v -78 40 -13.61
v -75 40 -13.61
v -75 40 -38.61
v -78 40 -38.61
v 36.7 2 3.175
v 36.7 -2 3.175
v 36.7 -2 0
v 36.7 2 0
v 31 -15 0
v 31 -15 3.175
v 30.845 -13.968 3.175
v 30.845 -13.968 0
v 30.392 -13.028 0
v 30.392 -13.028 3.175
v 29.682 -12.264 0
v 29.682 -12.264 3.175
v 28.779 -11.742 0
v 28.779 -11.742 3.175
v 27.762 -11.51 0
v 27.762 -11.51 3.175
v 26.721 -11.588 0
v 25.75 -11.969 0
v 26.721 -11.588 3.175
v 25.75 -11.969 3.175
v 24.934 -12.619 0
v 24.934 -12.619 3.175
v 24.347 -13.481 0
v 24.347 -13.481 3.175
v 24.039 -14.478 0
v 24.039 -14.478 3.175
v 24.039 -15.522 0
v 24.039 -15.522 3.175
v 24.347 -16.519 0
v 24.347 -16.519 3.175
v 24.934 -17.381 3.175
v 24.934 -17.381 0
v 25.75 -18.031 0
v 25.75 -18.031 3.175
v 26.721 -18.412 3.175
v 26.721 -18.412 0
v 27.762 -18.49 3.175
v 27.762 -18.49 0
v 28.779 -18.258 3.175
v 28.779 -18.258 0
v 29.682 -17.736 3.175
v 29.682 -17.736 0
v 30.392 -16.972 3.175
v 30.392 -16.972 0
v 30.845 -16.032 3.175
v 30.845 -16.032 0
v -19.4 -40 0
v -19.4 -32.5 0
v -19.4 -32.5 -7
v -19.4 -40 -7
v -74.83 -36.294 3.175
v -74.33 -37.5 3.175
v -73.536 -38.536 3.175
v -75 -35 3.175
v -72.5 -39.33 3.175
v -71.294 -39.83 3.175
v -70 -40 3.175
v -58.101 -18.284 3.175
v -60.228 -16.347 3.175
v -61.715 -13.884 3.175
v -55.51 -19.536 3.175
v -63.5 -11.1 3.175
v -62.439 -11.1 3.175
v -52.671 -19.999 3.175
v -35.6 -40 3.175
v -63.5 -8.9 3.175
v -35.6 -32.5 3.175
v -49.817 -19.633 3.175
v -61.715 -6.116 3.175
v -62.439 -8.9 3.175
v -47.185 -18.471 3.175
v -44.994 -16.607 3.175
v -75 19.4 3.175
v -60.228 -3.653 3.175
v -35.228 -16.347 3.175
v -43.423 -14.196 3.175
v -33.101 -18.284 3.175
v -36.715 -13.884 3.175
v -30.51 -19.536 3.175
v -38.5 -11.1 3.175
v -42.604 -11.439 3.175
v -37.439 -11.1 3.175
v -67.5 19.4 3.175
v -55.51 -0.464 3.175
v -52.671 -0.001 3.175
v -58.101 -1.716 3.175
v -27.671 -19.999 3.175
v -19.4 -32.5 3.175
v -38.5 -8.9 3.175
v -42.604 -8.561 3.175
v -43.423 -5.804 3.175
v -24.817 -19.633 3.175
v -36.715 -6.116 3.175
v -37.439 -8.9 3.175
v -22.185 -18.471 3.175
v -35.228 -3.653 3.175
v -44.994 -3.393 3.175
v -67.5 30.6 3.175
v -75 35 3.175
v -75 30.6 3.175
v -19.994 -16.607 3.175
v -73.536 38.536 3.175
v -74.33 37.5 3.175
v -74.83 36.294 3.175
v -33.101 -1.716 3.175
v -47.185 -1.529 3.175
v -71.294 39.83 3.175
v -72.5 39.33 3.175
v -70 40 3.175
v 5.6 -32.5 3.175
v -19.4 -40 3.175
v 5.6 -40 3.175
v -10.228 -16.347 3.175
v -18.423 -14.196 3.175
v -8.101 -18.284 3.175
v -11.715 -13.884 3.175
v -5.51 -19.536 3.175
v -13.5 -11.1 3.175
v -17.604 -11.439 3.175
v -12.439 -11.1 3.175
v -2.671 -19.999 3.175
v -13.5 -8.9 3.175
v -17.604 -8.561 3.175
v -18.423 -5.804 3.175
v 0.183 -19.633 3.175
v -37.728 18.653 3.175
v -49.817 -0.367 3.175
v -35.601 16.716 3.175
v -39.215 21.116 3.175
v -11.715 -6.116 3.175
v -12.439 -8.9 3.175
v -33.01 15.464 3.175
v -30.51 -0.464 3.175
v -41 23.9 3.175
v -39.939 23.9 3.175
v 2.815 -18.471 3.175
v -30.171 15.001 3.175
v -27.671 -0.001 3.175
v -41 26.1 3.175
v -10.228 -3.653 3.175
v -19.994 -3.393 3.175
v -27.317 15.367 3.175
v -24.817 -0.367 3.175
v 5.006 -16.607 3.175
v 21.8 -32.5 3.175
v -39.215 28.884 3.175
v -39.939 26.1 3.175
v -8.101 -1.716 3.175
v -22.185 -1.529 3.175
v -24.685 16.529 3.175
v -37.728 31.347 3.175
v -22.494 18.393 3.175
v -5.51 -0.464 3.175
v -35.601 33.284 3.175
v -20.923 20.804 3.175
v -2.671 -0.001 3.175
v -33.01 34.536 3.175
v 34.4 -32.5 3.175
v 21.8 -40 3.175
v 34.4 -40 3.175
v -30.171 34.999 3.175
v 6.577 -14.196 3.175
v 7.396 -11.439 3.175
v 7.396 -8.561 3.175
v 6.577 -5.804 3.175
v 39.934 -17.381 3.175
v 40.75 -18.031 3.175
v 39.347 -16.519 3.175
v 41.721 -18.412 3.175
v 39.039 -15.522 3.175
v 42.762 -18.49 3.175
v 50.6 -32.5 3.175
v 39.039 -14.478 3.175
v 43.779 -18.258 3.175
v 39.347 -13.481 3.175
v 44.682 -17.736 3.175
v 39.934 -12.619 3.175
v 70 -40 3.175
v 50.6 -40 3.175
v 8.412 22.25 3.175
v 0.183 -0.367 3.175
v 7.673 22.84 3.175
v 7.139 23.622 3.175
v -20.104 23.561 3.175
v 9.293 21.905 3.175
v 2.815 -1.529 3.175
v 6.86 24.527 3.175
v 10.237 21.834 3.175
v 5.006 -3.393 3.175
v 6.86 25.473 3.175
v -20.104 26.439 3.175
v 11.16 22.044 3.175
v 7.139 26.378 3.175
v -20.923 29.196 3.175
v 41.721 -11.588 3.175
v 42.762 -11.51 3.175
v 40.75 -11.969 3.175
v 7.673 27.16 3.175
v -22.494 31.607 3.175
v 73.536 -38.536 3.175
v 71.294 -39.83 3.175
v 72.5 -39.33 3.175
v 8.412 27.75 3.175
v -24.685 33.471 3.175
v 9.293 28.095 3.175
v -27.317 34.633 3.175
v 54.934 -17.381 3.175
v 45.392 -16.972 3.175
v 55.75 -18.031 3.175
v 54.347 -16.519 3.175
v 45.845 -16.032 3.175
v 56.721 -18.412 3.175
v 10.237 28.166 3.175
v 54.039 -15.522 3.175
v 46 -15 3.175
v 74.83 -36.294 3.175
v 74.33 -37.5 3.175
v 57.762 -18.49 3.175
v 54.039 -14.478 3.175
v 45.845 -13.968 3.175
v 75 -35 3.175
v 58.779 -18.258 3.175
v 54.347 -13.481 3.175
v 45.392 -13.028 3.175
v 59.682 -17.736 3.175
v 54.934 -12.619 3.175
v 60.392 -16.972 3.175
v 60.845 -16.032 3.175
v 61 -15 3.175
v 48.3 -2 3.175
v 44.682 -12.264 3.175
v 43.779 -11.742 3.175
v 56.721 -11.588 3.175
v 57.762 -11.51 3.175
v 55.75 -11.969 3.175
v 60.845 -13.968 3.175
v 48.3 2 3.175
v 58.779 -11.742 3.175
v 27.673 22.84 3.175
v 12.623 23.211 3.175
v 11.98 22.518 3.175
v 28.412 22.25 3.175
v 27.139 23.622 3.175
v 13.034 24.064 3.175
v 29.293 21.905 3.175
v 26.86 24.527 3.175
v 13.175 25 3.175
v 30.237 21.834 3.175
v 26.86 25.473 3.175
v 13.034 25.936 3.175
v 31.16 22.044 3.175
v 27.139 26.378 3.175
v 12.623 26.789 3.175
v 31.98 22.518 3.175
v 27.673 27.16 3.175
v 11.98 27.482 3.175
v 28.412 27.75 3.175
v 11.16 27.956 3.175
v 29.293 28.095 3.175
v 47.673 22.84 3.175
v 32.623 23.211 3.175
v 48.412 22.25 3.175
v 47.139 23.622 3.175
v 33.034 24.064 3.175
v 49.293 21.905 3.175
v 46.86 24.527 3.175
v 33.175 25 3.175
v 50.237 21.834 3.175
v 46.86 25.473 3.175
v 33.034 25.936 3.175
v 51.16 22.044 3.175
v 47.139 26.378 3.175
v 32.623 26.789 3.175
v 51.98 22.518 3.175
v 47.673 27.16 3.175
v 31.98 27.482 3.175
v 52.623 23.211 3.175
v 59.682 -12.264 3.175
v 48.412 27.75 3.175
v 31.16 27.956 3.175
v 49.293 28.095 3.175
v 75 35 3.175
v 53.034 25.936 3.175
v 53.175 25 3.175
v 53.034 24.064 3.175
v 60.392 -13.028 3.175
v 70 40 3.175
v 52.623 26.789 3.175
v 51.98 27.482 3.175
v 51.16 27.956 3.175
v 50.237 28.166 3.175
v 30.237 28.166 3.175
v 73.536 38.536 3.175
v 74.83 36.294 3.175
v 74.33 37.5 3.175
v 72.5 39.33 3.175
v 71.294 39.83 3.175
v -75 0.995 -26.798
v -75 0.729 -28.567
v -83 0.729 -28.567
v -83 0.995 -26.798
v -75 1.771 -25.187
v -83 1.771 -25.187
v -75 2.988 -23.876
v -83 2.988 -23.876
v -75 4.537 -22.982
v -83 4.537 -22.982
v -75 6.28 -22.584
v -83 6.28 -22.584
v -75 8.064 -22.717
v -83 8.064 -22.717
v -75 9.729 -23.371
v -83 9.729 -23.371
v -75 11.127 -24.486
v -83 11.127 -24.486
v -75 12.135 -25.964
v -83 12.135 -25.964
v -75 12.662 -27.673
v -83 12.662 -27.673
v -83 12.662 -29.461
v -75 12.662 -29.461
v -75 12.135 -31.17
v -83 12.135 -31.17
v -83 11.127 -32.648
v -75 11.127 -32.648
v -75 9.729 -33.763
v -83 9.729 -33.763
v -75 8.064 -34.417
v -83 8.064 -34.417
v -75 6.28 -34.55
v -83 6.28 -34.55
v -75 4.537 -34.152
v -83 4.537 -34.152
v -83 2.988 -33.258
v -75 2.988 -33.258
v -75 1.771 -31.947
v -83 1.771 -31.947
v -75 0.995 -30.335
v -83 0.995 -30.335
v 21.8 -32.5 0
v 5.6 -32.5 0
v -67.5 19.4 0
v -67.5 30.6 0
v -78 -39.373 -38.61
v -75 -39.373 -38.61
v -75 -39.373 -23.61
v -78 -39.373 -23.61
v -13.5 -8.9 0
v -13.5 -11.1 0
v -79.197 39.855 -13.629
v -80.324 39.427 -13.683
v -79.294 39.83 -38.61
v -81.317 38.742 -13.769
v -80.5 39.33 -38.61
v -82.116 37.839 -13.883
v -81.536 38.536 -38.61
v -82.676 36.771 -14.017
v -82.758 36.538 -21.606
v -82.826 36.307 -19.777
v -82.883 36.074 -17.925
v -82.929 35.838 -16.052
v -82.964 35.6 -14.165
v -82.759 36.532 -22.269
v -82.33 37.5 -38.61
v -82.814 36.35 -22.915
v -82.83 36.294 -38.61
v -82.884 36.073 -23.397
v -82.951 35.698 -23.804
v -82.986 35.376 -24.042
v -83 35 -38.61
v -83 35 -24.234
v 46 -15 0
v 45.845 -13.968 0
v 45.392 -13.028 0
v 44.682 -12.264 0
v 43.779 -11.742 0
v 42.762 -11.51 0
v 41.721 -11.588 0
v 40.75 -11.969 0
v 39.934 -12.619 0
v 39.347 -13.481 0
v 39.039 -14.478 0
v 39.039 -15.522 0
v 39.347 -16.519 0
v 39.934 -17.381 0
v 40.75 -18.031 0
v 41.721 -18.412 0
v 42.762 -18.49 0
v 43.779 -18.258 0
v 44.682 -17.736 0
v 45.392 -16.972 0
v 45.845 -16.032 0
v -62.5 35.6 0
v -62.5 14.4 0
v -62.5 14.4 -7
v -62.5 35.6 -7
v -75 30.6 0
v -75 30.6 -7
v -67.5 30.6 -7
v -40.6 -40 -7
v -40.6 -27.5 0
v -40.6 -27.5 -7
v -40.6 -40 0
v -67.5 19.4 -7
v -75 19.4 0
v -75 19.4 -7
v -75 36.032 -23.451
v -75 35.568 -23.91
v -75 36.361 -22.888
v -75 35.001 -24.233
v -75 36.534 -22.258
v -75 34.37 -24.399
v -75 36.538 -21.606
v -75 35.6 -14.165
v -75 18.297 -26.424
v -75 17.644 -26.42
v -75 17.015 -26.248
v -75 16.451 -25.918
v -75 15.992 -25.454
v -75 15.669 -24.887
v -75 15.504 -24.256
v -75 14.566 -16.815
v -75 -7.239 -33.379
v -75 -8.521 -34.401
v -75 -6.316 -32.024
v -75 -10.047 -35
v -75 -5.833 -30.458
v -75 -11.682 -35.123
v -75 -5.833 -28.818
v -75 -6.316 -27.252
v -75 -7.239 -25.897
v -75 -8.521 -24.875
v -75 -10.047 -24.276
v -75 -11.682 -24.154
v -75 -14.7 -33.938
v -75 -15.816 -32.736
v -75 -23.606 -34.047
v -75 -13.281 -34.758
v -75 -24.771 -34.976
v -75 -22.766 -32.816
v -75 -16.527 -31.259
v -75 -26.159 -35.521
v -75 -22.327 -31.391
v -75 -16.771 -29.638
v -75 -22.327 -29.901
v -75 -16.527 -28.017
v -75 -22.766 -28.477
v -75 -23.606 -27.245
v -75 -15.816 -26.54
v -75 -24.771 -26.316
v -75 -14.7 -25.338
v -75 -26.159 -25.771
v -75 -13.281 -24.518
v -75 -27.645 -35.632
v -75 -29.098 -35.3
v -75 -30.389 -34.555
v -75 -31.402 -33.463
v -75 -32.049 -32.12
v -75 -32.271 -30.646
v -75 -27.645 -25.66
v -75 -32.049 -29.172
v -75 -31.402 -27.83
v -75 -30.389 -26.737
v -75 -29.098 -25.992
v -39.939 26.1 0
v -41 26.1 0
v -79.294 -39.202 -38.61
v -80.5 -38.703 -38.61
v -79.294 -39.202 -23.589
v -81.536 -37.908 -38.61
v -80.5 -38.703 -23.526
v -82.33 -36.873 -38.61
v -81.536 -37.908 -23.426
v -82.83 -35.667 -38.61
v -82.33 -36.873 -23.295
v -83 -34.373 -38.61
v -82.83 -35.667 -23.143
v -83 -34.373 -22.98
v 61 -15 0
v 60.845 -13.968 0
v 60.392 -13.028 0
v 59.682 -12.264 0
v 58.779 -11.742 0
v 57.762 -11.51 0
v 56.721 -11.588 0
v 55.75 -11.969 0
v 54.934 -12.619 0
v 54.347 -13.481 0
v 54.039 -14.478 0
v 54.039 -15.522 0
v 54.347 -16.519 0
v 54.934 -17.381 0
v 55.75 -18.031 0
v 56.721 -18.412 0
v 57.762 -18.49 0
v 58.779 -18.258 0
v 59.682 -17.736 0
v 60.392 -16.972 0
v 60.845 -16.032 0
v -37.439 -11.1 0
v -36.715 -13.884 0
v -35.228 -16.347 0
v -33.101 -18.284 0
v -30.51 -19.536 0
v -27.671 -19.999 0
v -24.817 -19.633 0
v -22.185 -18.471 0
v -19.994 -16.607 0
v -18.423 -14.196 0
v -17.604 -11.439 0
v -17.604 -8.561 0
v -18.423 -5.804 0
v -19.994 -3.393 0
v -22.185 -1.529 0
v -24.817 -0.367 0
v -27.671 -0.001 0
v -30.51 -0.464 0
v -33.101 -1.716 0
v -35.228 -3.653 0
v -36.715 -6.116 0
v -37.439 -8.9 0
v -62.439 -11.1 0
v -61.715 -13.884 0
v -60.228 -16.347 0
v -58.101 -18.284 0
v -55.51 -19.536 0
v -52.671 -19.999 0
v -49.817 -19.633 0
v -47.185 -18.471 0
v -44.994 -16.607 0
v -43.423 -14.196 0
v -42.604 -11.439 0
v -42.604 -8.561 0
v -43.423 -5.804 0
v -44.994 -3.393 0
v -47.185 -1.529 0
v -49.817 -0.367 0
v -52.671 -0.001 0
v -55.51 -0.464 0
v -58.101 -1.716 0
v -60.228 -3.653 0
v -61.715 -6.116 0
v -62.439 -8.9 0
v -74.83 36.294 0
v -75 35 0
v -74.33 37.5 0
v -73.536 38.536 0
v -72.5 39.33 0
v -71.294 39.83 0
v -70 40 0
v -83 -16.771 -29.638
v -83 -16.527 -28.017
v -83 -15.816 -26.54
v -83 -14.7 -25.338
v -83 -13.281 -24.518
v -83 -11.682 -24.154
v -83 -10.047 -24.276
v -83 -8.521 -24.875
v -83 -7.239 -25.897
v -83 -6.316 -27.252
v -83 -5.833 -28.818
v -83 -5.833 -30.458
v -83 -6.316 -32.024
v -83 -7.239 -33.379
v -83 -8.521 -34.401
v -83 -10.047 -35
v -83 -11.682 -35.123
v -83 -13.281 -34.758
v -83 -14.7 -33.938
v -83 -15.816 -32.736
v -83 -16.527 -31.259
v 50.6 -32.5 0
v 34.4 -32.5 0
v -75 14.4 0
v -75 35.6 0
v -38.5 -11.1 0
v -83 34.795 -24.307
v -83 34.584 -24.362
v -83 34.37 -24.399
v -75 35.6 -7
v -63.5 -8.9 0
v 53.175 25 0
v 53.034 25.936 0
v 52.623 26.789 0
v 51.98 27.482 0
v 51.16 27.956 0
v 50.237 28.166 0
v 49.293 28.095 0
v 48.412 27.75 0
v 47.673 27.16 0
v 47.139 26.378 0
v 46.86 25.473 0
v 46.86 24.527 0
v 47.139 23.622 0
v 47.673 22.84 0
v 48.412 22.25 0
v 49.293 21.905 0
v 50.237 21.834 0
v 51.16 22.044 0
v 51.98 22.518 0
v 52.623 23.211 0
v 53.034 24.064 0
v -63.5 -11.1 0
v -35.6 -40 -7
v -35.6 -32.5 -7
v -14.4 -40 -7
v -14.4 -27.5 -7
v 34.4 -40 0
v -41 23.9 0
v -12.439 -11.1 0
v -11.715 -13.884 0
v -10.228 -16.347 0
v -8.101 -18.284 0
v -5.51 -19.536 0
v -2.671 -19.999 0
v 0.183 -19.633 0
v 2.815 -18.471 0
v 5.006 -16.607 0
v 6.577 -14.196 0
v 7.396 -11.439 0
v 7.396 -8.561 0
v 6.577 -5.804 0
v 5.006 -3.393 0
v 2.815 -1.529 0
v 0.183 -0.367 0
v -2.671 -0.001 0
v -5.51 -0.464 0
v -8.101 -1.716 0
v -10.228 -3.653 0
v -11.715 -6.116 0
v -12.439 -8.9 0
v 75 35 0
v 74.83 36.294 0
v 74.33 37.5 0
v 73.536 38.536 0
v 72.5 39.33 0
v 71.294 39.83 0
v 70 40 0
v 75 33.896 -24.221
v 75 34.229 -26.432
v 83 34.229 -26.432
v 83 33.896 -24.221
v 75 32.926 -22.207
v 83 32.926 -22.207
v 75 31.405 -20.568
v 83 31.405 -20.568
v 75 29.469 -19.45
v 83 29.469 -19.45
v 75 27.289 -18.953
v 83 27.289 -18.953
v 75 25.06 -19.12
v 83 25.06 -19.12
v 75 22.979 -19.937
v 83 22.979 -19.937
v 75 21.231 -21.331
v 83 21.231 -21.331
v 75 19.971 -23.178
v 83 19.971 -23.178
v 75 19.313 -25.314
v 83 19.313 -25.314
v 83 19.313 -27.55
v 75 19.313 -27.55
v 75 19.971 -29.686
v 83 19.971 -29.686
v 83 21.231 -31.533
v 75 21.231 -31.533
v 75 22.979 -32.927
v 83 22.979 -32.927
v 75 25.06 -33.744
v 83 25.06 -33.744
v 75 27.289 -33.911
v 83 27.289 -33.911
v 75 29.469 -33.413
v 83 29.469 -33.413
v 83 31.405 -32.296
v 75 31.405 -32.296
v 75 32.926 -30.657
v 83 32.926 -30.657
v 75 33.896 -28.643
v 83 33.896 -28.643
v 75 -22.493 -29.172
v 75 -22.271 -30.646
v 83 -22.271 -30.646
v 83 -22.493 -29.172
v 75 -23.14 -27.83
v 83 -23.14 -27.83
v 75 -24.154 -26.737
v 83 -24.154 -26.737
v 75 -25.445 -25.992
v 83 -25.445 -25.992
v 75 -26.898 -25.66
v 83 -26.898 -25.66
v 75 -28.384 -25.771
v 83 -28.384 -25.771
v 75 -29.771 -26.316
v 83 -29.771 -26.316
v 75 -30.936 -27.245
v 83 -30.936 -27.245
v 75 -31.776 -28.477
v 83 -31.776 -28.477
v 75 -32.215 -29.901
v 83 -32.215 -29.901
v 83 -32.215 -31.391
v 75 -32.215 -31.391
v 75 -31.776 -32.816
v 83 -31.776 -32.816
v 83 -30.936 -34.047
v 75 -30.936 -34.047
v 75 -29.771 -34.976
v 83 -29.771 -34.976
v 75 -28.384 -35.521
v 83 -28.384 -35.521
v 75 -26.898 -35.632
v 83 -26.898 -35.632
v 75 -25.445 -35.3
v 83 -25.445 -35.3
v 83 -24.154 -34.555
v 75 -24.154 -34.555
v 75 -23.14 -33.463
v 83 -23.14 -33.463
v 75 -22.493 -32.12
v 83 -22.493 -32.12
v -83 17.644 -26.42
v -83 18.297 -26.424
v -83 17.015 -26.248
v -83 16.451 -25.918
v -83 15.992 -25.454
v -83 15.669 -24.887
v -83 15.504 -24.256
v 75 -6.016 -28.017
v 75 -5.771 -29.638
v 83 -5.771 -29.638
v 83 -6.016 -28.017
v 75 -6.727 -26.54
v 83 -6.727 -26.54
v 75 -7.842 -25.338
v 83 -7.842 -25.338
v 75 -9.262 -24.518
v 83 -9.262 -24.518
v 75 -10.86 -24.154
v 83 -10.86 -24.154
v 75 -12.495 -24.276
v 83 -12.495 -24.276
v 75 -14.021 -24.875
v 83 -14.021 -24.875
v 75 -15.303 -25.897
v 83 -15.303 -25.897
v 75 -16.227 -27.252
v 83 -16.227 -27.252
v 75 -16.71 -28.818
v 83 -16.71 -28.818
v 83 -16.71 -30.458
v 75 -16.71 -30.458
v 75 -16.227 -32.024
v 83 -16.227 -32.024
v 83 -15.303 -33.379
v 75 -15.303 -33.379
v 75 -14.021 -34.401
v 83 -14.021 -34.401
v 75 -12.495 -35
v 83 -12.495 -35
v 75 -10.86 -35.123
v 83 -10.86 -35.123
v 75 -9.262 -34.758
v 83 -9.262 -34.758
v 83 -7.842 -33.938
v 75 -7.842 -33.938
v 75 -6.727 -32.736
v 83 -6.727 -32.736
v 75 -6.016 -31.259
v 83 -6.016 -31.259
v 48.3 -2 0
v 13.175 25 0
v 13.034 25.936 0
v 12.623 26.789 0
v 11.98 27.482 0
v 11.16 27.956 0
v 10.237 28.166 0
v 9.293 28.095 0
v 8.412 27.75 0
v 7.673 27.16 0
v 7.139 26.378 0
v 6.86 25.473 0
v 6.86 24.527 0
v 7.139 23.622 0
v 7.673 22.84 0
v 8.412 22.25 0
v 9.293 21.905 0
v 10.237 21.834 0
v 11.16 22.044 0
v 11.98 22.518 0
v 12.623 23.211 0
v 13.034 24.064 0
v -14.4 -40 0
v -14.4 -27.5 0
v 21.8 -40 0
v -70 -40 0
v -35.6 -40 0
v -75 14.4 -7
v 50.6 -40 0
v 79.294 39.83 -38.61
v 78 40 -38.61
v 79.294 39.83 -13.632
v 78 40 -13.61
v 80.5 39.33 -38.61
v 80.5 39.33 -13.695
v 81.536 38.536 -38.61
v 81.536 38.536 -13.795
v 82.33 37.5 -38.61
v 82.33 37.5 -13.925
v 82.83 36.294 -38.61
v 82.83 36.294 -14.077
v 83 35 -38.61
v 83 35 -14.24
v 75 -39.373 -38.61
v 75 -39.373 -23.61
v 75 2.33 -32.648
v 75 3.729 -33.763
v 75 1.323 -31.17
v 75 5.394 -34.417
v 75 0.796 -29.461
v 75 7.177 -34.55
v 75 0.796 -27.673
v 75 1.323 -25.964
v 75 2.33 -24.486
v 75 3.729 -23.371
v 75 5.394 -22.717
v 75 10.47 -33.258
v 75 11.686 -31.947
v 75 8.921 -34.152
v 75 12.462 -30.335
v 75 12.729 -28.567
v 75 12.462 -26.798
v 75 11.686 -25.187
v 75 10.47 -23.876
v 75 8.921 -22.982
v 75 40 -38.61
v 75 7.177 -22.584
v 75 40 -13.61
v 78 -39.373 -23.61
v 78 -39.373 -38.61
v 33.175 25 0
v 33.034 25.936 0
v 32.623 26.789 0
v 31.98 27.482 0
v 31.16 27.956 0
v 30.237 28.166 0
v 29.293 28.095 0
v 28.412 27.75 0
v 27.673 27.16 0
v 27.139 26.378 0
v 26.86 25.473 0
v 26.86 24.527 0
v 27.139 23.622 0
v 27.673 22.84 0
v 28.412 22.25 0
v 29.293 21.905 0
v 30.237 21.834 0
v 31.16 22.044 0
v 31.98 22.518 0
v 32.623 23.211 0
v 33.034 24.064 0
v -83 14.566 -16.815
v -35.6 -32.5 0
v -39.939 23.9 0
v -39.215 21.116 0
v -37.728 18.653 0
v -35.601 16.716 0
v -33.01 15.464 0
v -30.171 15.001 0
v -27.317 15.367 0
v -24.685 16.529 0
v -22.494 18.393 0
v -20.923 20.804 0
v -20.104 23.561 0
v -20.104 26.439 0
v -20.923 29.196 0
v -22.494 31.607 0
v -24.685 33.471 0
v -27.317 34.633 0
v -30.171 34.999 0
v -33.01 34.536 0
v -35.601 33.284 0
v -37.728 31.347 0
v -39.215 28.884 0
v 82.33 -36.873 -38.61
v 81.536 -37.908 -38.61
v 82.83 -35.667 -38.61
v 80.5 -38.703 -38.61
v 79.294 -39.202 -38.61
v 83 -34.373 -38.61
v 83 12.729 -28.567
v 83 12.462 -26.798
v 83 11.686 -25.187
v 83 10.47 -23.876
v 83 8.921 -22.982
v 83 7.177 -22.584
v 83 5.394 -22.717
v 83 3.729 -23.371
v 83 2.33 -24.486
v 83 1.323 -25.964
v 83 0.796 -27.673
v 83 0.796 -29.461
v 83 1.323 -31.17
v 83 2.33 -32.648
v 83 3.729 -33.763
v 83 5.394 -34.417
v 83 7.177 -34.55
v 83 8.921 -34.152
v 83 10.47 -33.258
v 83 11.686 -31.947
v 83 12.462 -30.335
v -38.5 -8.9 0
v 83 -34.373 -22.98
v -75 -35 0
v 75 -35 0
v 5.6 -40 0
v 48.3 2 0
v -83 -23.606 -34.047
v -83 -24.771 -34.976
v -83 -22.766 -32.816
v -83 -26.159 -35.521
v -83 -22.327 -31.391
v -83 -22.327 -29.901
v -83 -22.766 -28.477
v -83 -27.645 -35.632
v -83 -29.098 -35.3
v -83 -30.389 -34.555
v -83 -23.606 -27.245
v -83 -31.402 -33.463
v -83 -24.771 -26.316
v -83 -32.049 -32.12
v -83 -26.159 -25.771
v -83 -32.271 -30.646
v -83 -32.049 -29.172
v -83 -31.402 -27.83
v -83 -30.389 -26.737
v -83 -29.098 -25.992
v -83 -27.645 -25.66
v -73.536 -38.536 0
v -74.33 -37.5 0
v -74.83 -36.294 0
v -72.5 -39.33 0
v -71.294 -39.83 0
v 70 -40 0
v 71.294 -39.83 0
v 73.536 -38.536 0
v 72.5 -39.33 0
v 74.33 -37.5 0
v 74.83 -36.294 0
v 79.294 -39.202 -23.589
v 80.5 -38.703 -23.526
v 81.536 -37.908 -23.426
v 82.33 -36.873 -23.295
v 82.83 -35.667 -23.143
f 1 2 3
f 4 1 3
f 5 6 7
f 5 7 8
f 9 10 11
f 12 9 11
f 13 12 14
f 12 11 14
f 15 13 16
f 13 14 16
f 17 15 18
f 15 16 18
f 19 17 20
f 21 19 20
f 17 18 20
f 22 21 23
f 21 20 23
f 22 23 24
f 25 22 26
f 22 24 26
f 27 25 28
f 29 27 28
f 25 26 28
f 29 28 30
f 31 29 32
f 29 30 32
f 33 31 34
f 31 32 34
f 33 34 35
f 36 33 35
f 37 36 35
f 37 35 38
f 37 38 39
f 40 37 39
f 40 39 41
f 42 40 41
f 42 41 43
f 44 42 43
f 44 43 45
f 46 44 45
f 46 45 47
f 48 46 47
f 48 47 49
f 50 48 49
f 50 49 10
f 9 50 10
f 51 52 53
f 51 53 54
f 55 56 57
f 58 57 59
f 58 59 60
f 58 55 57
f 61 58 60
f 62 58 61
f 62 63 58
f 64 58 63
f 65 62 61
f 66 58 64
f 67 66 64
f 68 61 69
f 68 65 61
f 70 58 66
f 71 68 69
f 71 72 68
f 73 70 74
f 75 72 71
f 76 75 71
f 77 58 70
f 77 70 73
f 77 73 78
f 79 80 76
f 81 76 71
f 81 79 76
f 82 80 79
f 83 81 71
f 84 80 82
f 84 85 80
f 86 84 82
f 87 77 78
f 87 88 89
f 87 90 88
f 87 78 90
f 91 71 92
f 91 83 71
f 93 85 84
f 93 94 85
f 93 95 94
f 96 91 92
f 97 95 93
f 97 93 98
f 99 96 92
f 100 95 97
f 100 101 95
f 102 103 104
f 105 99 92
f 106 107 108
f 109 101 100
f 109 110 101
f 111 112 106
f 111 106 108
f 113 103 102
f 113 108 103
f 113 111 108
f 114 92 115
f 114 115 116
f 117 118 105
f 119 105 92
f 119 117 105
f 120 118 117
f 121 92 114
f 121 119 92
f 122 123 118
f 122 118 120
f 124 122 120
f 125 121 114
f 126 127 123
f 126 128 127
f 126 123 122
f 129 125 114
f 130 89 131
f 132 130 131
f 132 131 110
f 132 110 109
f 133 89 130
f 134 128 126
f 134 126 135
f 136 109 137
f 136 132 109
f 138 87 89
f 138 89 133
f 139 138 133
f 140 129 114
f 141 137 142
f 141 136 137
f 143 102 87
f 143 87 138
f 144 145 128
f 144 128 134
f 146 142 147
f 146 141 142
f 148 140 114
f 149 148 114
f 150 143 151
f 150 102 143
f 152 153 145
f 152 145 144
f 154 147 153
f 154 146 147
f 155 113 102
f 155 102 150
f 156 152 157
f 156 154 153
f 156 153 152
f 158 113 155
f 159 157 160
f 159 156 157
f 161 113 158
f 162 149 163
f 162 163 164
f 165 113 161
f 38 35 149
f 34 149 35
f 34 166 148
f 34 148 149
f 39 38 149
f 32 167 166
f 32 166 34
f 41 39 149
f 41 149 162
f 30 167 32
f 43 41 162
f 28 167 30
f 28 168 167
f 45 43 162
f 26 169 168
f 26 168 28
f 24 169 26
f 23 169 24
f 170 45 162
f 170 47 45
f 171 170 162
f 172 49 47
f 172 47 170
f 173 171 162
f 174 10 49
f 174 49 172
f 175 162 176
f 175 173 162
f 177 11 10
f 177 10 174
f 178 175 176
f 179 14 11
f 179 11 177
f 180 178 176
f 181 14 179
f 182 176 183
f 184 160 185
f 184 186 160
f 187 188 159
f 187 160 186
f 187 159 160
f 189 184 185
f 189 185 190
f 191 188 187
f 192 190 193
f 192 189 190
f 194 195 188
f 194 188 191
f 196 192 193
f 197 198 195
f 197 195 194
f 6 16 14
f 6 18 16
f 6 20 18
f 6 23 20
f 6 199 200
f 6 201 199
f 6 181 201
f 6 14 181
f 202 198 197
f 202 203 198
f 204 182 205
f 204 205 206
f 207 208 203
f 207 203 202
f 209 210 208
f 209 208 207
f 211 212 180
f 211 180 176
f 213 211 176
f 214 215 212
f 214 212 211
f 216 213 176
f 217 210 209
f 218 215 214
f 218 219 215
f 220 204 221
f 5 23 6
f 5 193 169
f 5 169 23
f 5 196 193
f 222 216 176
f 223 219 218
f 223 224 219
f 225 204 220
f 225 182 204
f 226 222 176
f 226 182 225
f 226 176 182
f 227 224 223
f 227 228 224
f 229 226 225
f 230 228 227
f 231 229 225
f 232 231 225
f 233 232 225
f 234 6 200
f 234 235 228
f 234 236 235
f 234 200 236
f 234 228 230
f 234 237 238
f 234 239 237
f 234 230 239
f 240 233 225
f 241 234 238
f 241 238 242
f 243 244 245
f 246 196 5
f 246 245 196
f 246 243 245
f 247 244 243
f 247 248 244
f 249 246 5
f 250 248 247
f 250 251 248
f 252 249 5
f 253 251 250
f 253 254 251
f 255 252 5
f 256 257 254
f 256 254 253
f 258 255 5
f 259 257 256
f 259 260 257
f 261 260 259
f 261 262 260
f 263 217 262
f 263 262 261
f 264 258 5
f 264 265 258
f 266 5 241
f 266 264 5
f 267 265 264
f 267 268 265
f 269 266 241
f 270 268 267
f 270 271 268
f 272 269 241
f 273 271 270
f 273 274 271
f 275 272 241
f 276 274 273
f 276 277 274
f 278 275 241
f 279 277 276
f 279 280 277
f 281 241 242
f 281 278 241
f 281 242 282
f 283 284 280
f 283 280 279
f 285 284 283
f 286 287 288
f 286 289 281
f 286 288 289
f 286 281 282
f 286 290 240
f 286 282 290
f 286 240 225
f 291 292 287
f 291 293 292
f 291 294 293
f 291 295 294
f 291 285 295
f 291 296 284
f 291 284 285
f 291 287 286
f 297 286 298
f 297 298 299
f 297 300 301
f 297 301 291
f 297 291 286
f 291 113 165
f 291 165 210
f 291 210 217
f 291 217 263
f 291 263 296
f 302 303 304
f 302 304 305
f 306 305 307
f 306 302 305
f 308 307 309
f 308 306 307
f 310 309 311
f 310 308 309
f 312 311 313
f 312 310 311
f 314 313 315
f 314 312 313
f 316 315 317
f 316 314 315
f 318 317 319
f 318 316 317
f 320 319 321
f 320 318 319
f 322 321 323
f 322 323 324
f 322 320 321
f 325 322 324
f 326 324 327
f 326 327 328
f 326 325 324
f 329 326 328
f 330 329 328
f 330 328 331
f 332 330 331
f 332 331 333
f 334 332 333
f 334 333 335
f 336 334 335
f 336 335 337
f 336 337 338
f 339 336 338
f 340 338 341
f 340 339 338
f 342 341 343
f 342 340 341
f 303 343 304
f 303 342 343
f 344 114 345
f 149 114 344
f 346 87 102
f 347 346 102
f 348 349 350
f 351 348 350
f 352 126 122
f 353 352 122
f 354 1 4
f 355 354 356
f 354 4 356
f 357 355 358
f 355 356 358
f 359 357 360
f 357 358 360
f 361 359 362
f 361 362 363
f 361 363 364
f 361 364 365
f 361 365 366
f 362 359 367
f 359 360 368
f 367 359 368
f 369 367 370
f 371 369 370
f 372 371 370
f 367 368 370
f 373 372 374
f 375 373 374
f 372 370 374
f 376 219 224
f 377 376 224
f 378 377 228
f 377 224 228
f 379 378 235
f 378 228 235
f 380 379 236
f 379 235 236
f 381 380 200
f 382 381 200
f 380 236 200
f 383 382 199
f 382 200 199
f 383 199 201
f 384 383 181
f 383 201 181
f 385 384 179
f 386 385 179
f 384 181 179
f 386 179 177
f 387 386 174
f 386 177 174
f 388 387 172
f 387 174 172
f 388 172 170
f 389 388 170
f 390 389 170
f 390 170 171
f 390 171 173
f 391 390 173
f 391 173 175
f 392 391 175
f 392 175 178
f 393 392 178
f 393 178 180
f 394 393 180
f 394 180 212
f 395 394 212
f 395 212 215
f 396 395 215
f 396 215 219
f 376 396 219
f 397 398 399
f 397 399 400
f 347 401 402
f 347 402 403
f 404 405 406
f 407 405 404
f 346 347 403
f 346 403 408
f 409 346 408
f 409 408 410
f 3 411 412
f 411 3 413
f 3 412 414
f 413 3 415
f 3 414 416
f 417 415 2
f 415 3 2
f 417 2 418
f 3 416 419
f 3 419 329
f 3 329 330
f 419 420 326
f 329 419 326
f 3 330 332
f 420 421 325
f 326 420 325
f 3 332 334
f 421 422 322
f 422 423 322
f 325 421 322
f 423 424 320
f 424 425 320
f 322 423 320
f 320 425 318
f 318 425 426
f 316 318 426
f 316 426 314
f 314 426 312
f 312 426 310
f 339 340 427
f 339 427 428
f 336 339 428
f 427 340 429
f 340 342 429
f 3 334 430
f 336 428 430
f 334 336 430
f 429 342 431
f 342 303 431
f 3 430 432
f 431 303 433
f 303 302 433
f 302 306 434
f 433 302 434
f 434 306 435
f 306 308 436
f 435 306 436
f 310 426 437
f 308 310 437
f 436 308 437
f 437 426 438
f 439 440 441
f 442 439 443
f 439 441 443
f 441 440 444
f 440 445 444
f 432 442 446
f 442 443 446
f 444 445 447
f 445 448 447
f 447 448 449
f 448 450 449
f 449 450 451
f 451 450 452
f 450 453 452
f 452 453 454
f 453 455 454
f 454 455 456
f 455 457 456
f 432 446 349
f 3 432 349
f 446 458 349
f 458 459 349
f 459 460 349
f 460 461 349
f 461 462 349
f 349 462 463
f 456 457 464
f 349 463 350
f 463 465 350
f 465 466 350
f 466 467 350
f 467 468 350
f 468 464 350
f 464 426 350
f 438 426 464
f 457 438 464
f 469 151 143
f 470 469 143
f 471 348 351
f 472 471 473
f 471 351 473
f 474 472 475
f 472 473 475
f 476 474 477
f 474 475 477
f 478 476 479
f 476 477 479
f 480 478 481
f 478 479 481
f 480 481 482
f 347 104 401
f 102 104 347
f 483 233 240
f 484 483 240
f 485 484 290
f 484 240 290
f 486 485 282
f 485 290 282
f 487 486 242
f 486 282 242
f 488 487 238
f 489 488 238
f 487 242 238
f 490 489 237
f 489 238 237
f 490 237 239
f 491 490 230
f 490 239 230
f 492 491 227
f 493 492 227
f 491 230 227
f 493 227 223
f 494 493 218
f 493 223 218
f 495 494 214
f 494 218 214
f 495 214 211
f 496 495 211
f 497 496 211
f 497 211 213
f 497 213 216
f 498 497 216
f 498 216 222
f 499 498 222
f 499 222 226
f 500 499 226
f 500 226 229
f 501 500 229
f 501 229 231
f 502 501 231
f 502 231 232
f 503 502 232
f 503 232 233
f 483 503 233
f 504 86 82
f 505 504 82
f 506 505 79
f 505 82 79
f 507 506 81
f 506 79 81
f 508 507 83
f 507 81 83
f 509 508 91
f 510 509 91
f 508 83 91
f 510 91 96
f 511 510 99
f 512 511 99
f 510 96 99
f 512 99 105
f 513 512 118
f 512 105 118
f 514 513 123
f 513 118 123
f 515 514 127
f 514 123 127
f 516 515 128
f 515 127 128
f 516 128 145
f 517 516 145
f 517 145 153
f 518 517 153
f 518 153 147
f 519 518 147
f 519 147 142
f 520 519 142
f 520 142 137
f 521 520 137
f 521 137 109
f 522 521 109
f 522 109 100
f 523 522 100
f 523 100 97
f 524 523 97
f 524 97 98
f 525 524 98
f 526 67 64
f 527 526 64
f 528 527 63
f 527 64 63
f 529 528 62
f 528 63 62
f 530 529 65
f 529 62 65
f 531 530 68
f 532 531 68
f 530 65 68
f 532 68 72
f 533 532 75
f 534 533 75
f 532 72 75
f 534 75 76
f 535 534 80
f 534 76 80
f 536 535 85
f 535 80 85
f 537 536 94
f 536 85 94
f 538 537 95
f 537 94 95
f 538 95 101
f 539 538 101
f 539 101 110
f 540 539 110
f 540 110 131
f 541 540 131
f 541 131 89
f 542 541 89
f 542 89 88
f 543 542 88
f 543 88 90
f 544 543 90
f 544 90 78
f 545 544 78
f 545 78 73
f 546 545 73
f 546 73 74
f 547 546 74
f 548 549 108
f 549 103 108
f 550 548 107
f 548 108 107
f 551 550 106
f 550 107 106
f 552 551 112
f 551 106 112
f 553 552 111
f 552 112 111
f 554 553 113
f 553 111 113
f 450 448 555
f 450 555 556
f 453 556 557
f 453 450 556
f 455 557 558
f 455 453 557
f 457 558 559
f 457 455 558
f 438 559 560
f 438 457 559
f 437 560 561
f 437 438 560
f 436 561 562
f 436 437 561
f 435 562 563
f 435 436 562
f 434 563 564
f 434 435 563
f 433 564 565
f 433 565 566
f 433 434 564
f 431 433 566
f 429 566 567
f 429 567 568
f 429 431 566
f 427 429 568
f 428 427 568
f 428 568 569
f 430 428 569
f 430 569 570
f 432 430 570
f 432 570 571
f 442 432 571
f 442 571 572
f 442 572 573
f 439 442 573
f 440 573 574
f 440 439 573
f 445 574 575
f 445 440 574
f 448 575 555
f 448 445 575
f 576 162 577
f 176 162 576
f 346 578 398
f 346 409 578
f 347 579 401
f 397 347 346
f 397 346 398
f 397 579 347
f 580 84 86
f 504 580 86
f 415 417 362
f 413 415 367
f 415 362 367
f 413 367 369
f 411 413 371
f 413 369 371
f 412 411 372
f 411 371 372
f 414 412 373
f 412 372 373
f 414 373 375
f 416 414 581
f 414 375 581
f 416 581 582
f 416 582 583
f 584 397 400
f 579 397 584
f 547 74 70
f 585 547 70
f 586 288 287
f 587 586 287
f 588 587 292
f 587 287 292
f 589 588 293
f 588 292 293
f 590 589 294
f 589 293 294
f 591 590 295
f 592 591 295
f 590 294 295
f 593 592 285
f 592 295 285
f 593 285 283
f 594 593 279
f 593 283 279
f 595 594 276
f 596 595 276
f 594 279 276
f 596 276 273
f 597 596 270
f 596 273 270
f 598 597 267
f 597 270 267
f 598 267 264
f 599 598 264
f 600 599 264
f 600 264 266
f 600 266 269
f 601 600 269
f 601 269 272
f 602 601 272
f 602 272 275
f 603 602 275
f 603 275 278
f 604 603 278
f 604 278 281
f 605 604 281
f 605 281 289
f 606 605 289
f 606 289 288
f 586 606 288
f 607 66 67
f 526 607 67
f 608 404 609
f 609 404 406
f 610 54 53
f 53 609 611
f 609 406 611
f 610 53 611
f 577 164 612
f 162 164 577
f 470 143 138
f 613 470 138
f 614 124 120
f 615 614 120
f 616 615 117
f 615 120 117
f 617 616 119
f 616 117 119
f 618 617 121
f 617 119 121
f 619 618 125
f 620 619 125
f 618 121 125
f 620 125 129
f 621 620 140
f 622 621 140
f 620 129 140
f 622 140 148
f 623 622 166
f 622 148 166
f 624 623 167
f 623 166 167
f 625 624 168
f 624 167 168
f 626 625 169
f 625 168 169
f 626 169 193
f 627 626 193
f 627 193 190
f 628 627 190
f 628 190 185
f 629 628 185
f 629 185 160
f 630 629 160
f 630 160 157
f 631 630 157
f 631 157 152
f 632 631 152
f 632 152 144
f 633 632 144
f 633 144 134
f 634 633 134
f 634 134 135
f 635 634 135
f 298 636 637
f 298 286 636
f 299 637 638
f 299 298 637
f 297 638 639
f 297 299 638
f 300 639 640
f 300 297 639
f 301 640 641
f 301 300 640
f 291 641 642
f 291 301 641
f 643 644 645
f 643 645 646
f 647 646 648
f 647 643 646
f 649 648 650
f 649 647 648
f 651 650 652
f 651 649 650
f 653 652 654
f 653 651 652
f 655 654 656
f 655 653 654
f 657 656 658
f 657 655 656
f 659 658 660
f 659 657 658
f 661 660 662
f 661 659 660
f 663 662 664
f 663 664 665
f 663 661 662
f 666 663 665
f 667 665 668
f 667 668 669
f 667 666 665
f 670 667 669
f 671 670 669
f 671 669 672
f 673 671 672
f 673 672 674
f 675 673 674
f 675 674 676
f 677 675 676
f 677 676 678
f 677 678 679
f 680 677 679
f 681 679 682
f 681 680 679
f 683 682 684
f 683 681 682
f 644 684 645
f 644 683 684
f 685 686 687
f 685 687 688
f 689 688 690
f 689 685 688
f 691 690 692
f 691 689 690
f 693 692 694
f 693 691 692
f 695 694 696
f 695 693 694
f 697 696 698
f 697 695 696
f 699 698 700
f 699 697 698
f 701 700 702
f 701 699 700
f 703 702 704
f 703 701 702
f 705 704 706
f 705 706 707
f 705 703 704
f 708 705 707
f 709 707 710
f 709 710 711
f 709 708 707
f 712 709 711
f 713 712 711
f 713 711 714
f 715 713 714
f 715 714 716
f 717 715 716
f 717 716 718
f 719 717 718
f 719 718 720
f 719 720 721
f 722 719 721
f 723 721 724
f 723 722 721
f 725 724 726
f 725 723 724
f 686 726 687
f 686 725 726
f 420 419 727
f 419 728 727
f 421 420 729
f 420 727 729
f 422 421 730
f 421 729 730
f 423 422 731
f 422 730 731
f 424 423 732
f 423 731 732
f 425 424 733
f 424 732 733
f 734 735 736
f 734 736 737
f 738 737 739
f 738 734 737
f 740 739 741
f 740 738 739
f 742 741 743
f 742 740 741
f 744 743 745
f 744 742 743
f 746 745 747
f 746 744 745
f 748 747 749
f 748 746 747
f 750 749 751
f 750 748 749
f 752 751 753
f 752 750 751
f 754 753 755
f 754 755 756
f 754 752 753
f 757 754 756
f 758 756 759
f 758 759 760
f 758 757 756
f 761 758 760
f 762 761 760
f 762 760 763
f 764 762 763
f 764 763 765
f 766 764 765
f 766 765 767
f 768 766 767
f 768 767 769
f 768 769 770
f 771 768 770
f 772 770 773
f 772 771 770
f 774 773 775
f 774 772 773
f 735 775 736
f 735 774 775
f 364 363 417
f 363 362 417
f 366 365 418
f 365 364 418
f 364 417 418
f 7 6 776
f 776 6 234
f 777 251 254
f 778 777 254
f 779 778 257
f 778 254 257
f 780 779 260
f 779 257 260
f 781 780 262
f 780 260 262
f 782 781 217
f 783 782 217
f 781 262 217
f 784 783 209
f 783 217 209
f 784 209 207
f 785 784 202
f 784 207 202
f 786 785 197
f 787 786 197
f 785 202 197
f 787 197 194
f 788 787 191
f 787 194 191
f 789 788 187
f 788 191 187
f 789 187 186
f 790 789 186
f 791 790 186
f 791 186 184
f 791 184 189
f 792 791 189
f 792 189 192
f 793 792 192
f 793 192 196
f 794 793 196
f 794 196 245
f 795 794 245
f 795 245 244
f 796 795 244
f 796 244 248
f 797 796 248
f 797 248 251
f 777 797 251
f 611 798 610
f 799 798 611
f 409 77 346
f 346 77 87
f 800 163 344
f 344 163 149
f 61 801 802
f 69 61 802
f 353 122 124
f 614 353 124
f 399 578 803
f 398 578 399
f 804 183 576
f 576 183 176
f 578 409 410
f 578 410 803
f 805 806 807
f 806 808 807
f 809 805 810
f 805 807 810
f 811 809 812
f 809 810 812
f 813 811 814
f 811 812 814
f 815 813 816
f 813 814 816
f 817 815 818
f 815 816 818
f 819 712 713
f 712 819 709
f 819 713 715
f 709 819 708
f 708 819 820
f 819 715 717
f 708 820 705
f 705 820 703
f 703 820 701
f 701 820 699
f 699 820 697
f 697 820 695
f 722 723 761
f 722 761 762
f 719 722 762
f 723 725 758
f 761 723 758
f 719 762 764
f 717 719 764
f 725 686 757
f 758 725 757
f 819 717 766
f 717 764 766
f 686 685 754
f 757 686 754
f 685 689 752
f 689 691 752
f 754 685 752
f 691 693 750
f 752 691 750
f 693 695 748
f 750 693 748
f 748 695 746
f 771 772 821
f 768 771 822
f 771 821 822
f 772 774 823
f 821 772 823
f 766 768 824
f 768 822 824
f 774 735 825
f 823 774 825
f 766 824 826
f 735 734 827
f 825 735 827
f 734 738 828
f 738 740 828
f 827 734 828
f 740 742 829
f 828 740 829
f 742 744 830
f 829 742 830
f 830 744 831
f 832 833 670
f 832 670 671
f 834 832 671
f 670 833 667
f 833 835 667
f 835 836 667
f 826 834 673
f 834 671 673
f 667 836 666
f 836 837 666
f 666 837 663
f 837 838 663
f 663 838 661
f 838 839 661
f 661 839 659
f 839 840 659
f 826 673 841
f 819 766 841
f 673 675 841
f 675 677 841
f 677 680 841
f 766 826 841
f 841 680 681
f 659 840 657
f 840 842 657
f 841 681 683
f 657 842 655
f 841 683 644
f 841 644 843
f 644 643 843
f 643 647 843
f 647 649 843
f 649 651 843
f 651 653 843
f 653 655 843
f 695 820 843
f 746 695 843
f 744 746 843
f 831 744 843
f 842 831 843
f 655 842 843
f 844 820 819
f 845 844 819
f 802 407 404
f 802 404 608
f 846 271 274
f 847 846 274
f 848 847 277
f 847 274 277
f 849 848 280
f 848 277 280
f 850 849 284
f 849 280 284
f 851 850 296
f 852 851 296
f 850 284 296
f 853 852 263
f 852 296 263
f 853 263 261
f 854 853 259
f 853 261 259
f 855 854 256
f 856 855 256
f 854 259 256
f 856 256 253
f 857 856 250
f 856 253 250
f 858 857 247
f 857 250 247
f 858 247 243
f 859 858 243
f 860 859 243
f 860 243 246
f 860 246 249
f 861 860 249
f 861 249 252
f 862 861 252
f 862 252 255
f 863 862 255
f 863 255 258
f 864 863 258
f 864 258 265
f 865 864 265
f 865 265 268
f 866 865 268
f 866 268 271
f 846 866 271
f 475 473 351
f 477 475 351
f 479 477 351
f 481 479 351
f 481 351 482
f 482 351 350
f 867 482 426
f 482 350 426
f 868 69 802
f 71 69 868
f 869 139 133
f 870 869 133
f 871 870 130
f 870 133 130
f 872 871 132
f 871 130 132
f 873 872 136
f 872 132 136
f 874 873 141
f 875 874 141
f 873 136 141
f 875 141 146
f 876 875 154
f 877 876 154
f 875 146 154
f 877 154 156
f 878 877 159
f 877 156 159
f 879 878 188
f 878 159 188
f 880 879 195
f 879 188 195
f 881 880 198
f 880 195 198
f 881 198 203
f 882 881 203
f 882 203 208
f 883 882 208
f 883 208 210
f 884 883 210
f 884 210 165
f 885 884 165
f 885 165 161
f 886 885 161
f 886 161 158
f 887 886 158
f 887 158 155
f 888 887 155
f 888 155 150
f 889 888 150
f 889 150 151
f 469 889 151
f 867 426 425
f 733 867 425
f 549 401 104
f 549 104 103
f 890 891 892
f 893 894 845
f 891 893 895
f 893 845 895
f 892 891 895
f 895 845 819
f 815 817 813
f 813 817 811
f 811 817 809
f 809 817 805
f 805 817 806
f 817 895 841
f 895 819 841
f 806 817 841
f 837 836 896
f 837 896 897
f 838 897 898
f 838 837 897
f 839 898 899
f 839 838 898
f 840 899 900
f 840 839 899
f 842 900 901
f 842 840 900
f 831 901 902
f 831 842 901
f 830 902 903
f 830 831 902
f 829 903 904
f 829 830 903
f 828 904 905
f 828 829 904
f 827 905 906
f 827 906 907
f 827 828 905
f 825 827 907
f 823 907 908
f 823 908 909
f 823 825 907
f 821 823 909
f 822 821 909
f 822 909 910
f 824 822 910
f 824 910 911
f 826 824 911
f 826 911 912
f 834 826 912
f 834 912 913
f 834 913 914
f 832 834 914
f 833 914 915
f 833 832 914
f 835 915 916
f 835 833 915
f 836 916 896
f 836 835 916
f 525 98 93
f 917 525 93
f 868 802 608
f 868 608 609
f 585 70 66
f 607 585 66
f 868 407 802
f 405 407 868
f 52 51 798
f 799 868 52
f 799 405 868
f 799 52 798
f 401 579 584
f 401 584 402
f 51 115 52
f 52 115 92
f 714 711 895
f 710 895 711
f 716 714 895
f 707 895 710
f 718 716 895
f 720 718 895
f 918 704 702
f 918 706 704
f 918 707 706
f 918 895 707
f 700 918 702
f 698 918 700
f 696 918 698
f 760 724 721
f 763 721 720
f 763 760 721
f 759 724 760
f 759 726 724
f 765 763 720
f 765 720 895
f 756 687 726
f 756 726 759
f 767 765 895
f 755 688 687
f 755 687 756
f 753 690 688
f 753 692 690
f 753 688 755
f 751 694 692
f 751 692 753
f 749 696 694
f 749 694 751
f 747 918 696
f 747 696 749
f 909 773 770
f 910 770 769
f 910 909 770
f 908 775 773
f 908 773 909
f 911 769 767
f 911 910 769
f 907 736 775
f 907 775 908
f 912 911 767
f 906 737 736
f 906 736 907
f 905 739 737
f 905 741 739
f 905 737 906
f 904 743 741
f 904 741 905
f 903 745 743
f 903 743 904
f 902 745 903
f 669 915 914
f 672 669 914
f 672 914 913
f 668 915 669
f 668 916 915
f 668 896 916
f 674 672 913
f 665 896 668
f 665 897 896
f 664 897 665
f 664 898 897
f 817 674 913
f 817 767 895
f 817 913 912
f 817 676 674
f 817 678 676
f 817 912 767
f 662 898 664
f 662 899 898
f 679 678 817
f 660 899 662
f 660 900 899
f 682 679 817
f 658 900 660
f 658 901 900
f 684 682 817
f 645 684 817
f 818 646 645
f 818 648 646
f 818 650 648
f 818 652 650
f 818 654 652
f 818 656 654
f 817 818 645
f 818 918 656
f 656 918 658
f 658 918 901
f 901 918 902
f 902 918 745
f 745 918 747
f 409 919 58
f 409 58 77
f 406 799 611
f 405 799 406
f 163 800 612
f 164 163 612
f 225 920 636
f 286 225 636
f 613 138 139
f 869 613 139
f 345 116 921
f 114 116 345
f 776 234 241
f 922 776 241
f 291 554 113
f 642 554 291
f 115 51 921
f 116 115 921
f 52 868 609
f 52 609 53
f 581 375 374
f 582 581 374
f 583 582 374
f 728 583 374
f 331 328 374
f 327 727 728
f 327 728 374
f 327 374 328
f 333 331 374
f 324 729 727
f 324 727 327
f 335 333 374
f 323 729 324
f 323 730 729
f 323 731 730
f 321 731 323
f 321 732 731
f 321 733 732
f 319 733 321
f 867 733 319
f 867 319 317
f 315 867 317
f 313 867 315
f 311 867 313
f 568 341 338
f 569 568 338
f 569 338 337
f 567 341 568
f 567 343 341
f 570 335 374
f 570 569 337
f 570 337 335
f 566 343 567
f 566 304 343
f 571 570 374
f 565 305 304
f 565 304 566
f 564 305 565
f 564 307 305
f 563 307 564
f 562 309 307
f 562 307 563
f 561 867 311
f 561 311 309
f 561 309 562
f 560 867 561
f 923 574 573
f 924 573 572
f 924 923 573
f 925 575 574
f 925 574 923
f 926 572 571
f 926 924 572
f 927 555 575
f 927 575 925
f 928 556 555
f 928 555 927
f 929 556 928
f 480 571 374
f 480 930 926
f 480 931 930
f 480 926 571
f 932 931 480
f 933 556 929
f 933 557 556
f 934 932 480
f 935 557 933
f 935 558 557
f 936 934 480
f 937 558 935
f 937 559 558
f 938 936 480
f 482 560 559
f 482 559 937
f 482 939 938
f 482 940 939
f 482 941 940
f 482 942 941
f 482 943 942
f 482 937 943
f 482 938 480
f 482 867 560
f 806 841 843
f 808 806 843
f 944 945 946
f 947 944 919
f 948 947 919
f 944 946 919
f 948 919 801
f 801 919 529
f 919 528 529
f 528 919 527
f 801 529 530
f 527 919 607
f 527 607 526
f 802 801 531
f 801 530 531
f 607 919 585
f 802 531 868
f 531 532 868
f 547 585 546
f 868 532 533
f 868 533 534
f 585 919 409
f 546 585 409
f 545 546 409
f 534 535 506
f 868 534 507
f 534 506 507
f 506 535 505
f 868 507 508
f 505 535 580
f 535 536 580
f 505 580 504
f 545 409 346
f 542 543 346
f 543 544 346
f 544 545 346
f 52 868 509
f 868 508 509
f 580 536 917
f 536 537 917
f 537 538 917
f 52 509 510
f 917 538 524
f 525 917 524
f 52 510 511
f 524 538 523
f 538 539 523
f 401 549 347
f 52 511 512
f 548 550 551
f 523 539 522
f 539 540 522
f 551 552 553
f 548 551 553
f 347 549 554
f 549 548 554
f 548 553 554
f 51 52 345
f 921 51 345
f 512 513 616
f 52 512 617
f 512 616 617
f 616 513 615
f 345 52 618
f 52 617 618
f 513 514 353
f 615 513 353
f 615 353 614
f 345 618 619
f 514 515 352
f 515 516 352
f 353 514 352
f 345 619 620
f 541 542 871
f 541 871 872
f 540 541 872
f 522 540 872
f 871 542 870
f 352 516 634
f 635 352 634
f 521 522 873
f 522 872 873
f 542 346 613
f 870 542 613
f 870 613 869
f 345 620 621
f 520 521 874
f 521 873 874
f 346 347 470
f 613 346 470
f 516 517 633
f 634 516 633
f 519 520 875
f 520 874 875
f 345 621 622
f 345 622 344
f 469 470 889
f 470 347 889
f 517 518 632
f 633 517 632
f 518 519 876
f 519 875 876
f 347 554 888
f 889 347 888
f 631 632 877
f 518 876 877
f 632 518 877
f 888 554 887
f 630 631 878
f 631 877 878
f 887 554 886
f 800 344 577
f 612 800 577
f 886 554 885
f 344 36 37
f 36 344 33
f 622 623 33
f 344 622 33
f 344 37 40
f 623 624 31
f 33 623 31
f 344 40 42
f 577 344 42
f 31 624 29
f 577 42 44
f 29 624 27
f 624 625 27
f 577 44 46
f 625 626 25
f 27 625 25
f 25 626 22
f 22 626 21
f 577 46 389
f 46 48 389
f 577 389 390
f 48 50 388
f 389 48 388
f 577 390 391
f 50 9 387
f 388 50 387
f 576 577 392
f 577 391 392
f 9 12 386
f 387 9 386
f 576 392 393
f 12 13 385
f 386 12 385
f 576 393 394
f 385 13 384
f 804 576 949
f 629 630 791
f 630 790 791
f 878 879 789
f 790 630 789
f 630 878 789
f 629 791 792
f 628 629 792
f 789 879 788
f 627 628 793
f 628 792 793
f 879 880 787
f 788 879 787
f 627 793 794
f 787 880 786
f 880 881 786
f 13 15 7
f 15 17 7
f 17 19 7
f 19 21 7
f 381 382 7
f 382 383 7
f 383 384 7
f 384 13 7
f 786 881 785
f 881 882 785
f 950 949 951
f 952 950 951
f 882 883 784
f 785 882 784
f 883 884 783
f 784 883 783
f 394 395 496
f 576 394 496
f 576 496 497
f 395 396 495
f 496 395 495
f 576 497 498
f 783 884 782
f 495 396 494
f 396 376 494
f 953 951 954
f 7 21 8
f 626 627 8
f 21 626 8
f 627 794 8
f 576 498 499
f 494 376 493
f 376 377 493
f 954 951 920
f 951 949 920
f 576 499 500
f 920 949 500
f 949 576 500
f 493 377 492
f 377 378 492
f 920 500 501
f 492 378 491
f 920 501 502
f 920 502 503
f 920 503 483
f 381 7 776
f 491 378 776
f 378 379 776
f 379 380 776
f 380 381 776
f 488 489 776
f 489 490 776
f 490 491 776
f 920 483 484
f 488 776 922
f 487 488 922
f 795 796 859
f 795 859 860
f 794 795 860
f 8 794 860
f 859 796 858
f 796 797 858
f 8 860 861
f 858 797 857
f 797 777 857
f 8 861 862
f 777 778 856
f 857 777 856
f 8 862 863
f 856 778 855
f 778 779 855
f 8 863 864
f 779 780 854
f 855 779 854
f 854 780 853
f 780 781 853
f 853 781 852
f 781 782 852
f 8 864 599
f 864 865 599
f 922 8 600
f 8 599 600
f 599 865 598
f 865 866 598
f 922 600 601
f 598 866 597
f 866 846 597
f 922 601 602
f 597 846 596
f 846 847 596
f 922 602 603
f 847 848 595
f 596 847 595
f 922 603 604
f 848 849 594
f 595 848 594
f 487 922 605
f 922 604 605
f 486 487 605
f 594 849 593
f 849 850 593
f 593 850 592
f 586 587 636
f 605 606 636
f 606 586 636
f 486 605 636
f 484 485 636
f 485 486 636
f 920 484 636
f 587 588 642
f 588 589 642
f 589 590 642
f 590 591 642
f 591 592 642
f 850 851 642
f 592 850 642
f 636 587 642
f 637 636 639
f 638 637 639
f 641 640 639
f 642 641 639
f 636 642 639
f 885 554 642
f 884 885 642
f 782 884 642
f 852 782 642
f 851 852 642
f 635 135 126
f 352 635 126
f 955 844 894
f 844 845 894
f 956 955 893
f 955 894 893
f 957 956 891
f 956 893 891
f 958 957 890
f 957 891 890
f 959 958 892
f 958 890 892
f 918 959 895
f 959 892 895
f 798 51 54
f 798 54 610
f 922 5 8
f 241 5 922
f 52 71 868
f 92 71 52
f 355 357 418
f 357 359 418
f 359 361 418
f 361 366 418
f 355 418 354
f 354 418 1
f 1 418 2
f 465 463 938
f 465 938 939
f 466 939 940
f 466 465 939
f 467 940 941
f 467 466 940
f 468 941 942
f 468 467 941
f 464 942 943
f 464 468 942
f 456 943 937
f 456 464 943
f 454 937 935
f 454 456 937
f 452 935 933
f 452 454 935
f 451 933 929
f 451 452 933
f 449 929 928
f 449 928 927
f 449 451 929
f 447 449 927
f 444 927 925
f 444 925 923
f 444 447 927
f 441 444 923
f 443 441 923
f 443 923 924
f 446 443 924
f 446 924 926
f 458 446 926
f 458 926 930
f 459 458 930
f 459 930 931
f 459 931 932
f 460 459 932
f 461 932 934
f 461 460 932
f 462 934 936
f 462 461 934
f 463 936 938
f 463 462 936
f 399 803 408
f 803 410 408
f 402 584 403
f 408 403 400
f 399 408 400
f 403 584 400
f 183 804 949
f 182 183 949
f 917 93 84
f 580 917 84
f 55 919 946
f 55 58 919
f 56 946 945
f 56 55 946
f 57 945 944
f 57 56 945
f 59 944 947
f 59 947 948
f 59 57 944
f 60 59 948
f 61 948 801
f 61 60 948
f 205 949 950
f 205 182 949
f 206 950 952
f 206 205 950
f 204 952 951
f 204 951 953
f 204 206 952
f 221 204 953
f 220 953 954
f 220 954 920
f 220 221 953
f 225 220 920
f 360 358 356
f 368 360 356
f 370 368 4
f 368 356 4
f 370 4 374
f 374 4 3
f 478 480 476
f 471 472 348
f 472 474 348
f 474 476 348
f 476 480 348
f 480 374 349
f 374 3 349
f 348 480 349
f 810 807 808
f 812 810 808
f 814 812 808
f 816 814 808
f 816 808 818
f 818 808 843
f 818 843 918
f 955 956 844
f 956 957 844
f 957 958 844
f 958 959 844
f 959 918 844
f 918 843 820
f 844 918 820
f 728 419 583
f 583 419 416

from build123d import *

# Parameters (mm, degrees)
F0_W      = 150
F0_H      = 80
F1_DEPTH  = 3.175
F2_R      = 5
F3_R      = 3.5
F3_R_2    = 3.175
F3_W      = 11.6
F3_H      = 4
F4_DEPTH  = 3.176
F5_W      = 7.5
F5_H      = 11.2
F5_W_2    = 16.2
F5_H_2    = 7.5
F6_DEPTH  = 3.176
F8_DEPTH  = 7
F10_DEPTH = 7
F11_R     = 5
F11_R_2   = 5.5
F11_R_3   = 6
F11_R_4   = 7.5
F12_DEPTH = 8
F13_R     = 6
F13_R_2   = 5.5
F13_R_3   = 5
F14_DEPTH = 8
F15_R     = 5
F15_2_R   = 5
F16_R     = 2.5


with BuildPart() as f1:
    # F0 (on Top) → F1 (new body)
    with BuildSketch(Plane.XY):
        Rectangle(F0_W, F0_H)
    extrude(amount=F1_DEPTH)

    # F2
    f2_edges = [f1.edges().sort_by_distance(p)[0] for p in [
        (-75, 40, 1.5875),
        (-75, -40, 1.5875),
        (75, -40, 1.5875),
        (75, 40, 1.5875),
    ]]
    fillet(f2_edges, radius=F2_R)

    # F3 (on face) → F4 (cut, through all)
    with BuildSketch(Plane.XY.offset(3.175)):
        with BuildLine():
            Line((-41, 23.9), (-39.939316, 23.9))
            ThreePointArc((-39.939316, 23.9), (-20, 25), (-39.939316, 26.1))
            Line((-39.939316, 26.1), (-41, 26.1))
            Line((-41, 26.1), (-41, 23.9))
        make_face()
        with BuildLine():
            Line((-63.5, -11.1), (-62.439316, -11.1))
            ThreePointArc((-62.439316, -11.1), (-42.5, -10), (-62.439316, -8.9))
            Line((-62.439316, -8.9), (-63.5, -8.9))
            Line((-63.5, -8.9), (-63.5, -11.1))
        make_face()
        with BuildLine():
            Line((-38.5, -11.1), (-37.439316, -11.1))
            ThreePointArc((-37.439316, -11.1), (-17.5, -10), (-37.439316, -8.9))
            Line((-37.439316, -8.9), (-38.5, -8.9))
            Line((-38.5, -8.9), (-38.5, -11.1))
        make_face()
        with BuildLine():
            Line((-13.5, -11.1), (-12.439316, -11.1))
            ThreePointArc((-12.439316, -11.1), (7.5, -10), (-12.439316, -8.9))
            Line((-12.439316, -8.9), (-13.5, -8.9))
            Line((-13.5, -8.9), (-13.5, -11.1))
        make_face()
        with Locations((27.5, -15)):
            Circle(F3_R)
        with Locations((42.5, -15)):
            Circle(F3_R)
        with Locations((57.5, -15)):
            Circle(F3_R)
        with Locations((10, 25)):
            Circle(F3_R_2)
        with Locations((30, 25)):
            Circle(F3_R_2)
        with Locations((50, 25)):
            Circle(F3_R_2)
        with Locations((42.5, 0)):
            Rectangle(F3_W, F3_H)
    extrude(amount=-F4_DEPTH, mode=Mode.SUBTRACT)

    # F5 (on face) → F6 (cut, through all)
    with BuildSketch(Plane.XY.offset(3.175)):
        with Locations((-71.25, 25)):
            Rectangle(F5_W, F5_H)
        with Locations((-27.5, -36.25)):
            Rectangle(F5_W_2, F5_H_2)
        with Locations((42.5, -36.25)):
            Rectangle(F5_W_2, F5_H_2)
        with Locations((13.7, -36.25)):
            Rectangle(F5_W_2, F5_H_2)
    extrude(amount=-F6_DEPTH, mode=Mode.SUBTRACT)


with BuildPart() as f8:
    # F7 (on Top) → F8 (new body)
    with BuildSketch(Plane.XY):
        Polygon((-75, 14.4), (-62.5, 14.4), (-62.5, 35.6), (-75, 35.6), (-75, 30.6), (-67.5, 30.6), (-67.5, 19.4), (-75, 19.4), align=None)
    extrude(amount=-F8_DEPTH)


with BuildPart() as f10:
    # F9 (on Top) → F10 (new body)
    with BuildSketch(Plane.XY):
        Polygon((-35.6, -40), (-35.6, -32.5), (-19.4, -32.5), (-19.4, -40), (-14.4, -40), (-14.4, -27.5), (-40.6, -27.5), (-40.6, -40), align=None)
    extrude(amount=-F10_DEPTH)


with BuildPart() as f12:
    # F11 (on face) → F12 (new body)
    with BuildSketch(Plane.YZ.offset(75)):
        Polygon((40, -38.610302), (40, -13.610302), (-39.372539, -23.610302), (-39.372539, -38.610302), align=None)
        with Locations((-27.27124, -30.646109)):
            Circle(F11_R, mode=Mode.SUBTRACT)
        with Locations((-11.27124, -29.638122)):
            Circle(F11_R_2, mode=Mode.SUBTRACT)
        with Locations((6.72876, -28.566959)):
            Circle(F11_R_3, mode=Mode.SUBTRACT)
        with Locations((26.72876, -26.431859)):
            Circle(F11_R_4, mode=Mode.SUBTRACT)
    extrude(amount=F12_DEPTH)

    # F15
    f15_edges = [f12.edges().sort_by_distance(p)[0] for p in [
        (83, -39.372539, -31.110302),
        (83, 40, -26.110302),
    ]]
    fillet(f15_edges, radius=F15_R)


with BuildPart() as f14:
    # F13 (on face) → F14 (new body)
    with BuildSketch(Plane(origin=(-75, 0, 0), x_dir=(0, -1, 0), z_dir=(-1, 0, 0))):
        Polygon((-35.6, -14.16465), (-40, -13.610302), (-40, -38.610302), (39.372539, -38.610302), (39.372539, -23.610302), (-14.566277, -16.81465), (-15.816277, -26.736218), (-36.85, -24.086218), align=None)
        with Locations((-6.72876, -28.566959)):
            Circle(F13_R, mode=Mode.SUBTRACT)
        with Locations((11.27124, -29.638122)):
            Circle(F13_R_2, mode=Mode.SUBTRACT)
        with Locations((27.27124, -30.646109)):
            Circle(F13_R_3, mode=Mode.SUBTRACT)
    extrude(amount=F14_DEPTH)

    # F15#2
    f15_2_edges = [f14.edges().sort_by_distance(p)[0] for p in [
        (-83, 40, -26.110302),
        (-83, -39.372539, -31.110302),
    ]]
    fillet(f15_2_edges, radius=F15_2_R)

    # F16
    f16_edges = [f14.edges().sort_by_distance(p)[0] for p in [
        (-79, 15.816277, -26.736218),
        (-78.822579, 36.85, -24.086218),
    ]]
    fillet(f16_edges, radius=F16_R)


solid = Compound([f1.part, f8.part, f10.part, f12.part, f14.part])
